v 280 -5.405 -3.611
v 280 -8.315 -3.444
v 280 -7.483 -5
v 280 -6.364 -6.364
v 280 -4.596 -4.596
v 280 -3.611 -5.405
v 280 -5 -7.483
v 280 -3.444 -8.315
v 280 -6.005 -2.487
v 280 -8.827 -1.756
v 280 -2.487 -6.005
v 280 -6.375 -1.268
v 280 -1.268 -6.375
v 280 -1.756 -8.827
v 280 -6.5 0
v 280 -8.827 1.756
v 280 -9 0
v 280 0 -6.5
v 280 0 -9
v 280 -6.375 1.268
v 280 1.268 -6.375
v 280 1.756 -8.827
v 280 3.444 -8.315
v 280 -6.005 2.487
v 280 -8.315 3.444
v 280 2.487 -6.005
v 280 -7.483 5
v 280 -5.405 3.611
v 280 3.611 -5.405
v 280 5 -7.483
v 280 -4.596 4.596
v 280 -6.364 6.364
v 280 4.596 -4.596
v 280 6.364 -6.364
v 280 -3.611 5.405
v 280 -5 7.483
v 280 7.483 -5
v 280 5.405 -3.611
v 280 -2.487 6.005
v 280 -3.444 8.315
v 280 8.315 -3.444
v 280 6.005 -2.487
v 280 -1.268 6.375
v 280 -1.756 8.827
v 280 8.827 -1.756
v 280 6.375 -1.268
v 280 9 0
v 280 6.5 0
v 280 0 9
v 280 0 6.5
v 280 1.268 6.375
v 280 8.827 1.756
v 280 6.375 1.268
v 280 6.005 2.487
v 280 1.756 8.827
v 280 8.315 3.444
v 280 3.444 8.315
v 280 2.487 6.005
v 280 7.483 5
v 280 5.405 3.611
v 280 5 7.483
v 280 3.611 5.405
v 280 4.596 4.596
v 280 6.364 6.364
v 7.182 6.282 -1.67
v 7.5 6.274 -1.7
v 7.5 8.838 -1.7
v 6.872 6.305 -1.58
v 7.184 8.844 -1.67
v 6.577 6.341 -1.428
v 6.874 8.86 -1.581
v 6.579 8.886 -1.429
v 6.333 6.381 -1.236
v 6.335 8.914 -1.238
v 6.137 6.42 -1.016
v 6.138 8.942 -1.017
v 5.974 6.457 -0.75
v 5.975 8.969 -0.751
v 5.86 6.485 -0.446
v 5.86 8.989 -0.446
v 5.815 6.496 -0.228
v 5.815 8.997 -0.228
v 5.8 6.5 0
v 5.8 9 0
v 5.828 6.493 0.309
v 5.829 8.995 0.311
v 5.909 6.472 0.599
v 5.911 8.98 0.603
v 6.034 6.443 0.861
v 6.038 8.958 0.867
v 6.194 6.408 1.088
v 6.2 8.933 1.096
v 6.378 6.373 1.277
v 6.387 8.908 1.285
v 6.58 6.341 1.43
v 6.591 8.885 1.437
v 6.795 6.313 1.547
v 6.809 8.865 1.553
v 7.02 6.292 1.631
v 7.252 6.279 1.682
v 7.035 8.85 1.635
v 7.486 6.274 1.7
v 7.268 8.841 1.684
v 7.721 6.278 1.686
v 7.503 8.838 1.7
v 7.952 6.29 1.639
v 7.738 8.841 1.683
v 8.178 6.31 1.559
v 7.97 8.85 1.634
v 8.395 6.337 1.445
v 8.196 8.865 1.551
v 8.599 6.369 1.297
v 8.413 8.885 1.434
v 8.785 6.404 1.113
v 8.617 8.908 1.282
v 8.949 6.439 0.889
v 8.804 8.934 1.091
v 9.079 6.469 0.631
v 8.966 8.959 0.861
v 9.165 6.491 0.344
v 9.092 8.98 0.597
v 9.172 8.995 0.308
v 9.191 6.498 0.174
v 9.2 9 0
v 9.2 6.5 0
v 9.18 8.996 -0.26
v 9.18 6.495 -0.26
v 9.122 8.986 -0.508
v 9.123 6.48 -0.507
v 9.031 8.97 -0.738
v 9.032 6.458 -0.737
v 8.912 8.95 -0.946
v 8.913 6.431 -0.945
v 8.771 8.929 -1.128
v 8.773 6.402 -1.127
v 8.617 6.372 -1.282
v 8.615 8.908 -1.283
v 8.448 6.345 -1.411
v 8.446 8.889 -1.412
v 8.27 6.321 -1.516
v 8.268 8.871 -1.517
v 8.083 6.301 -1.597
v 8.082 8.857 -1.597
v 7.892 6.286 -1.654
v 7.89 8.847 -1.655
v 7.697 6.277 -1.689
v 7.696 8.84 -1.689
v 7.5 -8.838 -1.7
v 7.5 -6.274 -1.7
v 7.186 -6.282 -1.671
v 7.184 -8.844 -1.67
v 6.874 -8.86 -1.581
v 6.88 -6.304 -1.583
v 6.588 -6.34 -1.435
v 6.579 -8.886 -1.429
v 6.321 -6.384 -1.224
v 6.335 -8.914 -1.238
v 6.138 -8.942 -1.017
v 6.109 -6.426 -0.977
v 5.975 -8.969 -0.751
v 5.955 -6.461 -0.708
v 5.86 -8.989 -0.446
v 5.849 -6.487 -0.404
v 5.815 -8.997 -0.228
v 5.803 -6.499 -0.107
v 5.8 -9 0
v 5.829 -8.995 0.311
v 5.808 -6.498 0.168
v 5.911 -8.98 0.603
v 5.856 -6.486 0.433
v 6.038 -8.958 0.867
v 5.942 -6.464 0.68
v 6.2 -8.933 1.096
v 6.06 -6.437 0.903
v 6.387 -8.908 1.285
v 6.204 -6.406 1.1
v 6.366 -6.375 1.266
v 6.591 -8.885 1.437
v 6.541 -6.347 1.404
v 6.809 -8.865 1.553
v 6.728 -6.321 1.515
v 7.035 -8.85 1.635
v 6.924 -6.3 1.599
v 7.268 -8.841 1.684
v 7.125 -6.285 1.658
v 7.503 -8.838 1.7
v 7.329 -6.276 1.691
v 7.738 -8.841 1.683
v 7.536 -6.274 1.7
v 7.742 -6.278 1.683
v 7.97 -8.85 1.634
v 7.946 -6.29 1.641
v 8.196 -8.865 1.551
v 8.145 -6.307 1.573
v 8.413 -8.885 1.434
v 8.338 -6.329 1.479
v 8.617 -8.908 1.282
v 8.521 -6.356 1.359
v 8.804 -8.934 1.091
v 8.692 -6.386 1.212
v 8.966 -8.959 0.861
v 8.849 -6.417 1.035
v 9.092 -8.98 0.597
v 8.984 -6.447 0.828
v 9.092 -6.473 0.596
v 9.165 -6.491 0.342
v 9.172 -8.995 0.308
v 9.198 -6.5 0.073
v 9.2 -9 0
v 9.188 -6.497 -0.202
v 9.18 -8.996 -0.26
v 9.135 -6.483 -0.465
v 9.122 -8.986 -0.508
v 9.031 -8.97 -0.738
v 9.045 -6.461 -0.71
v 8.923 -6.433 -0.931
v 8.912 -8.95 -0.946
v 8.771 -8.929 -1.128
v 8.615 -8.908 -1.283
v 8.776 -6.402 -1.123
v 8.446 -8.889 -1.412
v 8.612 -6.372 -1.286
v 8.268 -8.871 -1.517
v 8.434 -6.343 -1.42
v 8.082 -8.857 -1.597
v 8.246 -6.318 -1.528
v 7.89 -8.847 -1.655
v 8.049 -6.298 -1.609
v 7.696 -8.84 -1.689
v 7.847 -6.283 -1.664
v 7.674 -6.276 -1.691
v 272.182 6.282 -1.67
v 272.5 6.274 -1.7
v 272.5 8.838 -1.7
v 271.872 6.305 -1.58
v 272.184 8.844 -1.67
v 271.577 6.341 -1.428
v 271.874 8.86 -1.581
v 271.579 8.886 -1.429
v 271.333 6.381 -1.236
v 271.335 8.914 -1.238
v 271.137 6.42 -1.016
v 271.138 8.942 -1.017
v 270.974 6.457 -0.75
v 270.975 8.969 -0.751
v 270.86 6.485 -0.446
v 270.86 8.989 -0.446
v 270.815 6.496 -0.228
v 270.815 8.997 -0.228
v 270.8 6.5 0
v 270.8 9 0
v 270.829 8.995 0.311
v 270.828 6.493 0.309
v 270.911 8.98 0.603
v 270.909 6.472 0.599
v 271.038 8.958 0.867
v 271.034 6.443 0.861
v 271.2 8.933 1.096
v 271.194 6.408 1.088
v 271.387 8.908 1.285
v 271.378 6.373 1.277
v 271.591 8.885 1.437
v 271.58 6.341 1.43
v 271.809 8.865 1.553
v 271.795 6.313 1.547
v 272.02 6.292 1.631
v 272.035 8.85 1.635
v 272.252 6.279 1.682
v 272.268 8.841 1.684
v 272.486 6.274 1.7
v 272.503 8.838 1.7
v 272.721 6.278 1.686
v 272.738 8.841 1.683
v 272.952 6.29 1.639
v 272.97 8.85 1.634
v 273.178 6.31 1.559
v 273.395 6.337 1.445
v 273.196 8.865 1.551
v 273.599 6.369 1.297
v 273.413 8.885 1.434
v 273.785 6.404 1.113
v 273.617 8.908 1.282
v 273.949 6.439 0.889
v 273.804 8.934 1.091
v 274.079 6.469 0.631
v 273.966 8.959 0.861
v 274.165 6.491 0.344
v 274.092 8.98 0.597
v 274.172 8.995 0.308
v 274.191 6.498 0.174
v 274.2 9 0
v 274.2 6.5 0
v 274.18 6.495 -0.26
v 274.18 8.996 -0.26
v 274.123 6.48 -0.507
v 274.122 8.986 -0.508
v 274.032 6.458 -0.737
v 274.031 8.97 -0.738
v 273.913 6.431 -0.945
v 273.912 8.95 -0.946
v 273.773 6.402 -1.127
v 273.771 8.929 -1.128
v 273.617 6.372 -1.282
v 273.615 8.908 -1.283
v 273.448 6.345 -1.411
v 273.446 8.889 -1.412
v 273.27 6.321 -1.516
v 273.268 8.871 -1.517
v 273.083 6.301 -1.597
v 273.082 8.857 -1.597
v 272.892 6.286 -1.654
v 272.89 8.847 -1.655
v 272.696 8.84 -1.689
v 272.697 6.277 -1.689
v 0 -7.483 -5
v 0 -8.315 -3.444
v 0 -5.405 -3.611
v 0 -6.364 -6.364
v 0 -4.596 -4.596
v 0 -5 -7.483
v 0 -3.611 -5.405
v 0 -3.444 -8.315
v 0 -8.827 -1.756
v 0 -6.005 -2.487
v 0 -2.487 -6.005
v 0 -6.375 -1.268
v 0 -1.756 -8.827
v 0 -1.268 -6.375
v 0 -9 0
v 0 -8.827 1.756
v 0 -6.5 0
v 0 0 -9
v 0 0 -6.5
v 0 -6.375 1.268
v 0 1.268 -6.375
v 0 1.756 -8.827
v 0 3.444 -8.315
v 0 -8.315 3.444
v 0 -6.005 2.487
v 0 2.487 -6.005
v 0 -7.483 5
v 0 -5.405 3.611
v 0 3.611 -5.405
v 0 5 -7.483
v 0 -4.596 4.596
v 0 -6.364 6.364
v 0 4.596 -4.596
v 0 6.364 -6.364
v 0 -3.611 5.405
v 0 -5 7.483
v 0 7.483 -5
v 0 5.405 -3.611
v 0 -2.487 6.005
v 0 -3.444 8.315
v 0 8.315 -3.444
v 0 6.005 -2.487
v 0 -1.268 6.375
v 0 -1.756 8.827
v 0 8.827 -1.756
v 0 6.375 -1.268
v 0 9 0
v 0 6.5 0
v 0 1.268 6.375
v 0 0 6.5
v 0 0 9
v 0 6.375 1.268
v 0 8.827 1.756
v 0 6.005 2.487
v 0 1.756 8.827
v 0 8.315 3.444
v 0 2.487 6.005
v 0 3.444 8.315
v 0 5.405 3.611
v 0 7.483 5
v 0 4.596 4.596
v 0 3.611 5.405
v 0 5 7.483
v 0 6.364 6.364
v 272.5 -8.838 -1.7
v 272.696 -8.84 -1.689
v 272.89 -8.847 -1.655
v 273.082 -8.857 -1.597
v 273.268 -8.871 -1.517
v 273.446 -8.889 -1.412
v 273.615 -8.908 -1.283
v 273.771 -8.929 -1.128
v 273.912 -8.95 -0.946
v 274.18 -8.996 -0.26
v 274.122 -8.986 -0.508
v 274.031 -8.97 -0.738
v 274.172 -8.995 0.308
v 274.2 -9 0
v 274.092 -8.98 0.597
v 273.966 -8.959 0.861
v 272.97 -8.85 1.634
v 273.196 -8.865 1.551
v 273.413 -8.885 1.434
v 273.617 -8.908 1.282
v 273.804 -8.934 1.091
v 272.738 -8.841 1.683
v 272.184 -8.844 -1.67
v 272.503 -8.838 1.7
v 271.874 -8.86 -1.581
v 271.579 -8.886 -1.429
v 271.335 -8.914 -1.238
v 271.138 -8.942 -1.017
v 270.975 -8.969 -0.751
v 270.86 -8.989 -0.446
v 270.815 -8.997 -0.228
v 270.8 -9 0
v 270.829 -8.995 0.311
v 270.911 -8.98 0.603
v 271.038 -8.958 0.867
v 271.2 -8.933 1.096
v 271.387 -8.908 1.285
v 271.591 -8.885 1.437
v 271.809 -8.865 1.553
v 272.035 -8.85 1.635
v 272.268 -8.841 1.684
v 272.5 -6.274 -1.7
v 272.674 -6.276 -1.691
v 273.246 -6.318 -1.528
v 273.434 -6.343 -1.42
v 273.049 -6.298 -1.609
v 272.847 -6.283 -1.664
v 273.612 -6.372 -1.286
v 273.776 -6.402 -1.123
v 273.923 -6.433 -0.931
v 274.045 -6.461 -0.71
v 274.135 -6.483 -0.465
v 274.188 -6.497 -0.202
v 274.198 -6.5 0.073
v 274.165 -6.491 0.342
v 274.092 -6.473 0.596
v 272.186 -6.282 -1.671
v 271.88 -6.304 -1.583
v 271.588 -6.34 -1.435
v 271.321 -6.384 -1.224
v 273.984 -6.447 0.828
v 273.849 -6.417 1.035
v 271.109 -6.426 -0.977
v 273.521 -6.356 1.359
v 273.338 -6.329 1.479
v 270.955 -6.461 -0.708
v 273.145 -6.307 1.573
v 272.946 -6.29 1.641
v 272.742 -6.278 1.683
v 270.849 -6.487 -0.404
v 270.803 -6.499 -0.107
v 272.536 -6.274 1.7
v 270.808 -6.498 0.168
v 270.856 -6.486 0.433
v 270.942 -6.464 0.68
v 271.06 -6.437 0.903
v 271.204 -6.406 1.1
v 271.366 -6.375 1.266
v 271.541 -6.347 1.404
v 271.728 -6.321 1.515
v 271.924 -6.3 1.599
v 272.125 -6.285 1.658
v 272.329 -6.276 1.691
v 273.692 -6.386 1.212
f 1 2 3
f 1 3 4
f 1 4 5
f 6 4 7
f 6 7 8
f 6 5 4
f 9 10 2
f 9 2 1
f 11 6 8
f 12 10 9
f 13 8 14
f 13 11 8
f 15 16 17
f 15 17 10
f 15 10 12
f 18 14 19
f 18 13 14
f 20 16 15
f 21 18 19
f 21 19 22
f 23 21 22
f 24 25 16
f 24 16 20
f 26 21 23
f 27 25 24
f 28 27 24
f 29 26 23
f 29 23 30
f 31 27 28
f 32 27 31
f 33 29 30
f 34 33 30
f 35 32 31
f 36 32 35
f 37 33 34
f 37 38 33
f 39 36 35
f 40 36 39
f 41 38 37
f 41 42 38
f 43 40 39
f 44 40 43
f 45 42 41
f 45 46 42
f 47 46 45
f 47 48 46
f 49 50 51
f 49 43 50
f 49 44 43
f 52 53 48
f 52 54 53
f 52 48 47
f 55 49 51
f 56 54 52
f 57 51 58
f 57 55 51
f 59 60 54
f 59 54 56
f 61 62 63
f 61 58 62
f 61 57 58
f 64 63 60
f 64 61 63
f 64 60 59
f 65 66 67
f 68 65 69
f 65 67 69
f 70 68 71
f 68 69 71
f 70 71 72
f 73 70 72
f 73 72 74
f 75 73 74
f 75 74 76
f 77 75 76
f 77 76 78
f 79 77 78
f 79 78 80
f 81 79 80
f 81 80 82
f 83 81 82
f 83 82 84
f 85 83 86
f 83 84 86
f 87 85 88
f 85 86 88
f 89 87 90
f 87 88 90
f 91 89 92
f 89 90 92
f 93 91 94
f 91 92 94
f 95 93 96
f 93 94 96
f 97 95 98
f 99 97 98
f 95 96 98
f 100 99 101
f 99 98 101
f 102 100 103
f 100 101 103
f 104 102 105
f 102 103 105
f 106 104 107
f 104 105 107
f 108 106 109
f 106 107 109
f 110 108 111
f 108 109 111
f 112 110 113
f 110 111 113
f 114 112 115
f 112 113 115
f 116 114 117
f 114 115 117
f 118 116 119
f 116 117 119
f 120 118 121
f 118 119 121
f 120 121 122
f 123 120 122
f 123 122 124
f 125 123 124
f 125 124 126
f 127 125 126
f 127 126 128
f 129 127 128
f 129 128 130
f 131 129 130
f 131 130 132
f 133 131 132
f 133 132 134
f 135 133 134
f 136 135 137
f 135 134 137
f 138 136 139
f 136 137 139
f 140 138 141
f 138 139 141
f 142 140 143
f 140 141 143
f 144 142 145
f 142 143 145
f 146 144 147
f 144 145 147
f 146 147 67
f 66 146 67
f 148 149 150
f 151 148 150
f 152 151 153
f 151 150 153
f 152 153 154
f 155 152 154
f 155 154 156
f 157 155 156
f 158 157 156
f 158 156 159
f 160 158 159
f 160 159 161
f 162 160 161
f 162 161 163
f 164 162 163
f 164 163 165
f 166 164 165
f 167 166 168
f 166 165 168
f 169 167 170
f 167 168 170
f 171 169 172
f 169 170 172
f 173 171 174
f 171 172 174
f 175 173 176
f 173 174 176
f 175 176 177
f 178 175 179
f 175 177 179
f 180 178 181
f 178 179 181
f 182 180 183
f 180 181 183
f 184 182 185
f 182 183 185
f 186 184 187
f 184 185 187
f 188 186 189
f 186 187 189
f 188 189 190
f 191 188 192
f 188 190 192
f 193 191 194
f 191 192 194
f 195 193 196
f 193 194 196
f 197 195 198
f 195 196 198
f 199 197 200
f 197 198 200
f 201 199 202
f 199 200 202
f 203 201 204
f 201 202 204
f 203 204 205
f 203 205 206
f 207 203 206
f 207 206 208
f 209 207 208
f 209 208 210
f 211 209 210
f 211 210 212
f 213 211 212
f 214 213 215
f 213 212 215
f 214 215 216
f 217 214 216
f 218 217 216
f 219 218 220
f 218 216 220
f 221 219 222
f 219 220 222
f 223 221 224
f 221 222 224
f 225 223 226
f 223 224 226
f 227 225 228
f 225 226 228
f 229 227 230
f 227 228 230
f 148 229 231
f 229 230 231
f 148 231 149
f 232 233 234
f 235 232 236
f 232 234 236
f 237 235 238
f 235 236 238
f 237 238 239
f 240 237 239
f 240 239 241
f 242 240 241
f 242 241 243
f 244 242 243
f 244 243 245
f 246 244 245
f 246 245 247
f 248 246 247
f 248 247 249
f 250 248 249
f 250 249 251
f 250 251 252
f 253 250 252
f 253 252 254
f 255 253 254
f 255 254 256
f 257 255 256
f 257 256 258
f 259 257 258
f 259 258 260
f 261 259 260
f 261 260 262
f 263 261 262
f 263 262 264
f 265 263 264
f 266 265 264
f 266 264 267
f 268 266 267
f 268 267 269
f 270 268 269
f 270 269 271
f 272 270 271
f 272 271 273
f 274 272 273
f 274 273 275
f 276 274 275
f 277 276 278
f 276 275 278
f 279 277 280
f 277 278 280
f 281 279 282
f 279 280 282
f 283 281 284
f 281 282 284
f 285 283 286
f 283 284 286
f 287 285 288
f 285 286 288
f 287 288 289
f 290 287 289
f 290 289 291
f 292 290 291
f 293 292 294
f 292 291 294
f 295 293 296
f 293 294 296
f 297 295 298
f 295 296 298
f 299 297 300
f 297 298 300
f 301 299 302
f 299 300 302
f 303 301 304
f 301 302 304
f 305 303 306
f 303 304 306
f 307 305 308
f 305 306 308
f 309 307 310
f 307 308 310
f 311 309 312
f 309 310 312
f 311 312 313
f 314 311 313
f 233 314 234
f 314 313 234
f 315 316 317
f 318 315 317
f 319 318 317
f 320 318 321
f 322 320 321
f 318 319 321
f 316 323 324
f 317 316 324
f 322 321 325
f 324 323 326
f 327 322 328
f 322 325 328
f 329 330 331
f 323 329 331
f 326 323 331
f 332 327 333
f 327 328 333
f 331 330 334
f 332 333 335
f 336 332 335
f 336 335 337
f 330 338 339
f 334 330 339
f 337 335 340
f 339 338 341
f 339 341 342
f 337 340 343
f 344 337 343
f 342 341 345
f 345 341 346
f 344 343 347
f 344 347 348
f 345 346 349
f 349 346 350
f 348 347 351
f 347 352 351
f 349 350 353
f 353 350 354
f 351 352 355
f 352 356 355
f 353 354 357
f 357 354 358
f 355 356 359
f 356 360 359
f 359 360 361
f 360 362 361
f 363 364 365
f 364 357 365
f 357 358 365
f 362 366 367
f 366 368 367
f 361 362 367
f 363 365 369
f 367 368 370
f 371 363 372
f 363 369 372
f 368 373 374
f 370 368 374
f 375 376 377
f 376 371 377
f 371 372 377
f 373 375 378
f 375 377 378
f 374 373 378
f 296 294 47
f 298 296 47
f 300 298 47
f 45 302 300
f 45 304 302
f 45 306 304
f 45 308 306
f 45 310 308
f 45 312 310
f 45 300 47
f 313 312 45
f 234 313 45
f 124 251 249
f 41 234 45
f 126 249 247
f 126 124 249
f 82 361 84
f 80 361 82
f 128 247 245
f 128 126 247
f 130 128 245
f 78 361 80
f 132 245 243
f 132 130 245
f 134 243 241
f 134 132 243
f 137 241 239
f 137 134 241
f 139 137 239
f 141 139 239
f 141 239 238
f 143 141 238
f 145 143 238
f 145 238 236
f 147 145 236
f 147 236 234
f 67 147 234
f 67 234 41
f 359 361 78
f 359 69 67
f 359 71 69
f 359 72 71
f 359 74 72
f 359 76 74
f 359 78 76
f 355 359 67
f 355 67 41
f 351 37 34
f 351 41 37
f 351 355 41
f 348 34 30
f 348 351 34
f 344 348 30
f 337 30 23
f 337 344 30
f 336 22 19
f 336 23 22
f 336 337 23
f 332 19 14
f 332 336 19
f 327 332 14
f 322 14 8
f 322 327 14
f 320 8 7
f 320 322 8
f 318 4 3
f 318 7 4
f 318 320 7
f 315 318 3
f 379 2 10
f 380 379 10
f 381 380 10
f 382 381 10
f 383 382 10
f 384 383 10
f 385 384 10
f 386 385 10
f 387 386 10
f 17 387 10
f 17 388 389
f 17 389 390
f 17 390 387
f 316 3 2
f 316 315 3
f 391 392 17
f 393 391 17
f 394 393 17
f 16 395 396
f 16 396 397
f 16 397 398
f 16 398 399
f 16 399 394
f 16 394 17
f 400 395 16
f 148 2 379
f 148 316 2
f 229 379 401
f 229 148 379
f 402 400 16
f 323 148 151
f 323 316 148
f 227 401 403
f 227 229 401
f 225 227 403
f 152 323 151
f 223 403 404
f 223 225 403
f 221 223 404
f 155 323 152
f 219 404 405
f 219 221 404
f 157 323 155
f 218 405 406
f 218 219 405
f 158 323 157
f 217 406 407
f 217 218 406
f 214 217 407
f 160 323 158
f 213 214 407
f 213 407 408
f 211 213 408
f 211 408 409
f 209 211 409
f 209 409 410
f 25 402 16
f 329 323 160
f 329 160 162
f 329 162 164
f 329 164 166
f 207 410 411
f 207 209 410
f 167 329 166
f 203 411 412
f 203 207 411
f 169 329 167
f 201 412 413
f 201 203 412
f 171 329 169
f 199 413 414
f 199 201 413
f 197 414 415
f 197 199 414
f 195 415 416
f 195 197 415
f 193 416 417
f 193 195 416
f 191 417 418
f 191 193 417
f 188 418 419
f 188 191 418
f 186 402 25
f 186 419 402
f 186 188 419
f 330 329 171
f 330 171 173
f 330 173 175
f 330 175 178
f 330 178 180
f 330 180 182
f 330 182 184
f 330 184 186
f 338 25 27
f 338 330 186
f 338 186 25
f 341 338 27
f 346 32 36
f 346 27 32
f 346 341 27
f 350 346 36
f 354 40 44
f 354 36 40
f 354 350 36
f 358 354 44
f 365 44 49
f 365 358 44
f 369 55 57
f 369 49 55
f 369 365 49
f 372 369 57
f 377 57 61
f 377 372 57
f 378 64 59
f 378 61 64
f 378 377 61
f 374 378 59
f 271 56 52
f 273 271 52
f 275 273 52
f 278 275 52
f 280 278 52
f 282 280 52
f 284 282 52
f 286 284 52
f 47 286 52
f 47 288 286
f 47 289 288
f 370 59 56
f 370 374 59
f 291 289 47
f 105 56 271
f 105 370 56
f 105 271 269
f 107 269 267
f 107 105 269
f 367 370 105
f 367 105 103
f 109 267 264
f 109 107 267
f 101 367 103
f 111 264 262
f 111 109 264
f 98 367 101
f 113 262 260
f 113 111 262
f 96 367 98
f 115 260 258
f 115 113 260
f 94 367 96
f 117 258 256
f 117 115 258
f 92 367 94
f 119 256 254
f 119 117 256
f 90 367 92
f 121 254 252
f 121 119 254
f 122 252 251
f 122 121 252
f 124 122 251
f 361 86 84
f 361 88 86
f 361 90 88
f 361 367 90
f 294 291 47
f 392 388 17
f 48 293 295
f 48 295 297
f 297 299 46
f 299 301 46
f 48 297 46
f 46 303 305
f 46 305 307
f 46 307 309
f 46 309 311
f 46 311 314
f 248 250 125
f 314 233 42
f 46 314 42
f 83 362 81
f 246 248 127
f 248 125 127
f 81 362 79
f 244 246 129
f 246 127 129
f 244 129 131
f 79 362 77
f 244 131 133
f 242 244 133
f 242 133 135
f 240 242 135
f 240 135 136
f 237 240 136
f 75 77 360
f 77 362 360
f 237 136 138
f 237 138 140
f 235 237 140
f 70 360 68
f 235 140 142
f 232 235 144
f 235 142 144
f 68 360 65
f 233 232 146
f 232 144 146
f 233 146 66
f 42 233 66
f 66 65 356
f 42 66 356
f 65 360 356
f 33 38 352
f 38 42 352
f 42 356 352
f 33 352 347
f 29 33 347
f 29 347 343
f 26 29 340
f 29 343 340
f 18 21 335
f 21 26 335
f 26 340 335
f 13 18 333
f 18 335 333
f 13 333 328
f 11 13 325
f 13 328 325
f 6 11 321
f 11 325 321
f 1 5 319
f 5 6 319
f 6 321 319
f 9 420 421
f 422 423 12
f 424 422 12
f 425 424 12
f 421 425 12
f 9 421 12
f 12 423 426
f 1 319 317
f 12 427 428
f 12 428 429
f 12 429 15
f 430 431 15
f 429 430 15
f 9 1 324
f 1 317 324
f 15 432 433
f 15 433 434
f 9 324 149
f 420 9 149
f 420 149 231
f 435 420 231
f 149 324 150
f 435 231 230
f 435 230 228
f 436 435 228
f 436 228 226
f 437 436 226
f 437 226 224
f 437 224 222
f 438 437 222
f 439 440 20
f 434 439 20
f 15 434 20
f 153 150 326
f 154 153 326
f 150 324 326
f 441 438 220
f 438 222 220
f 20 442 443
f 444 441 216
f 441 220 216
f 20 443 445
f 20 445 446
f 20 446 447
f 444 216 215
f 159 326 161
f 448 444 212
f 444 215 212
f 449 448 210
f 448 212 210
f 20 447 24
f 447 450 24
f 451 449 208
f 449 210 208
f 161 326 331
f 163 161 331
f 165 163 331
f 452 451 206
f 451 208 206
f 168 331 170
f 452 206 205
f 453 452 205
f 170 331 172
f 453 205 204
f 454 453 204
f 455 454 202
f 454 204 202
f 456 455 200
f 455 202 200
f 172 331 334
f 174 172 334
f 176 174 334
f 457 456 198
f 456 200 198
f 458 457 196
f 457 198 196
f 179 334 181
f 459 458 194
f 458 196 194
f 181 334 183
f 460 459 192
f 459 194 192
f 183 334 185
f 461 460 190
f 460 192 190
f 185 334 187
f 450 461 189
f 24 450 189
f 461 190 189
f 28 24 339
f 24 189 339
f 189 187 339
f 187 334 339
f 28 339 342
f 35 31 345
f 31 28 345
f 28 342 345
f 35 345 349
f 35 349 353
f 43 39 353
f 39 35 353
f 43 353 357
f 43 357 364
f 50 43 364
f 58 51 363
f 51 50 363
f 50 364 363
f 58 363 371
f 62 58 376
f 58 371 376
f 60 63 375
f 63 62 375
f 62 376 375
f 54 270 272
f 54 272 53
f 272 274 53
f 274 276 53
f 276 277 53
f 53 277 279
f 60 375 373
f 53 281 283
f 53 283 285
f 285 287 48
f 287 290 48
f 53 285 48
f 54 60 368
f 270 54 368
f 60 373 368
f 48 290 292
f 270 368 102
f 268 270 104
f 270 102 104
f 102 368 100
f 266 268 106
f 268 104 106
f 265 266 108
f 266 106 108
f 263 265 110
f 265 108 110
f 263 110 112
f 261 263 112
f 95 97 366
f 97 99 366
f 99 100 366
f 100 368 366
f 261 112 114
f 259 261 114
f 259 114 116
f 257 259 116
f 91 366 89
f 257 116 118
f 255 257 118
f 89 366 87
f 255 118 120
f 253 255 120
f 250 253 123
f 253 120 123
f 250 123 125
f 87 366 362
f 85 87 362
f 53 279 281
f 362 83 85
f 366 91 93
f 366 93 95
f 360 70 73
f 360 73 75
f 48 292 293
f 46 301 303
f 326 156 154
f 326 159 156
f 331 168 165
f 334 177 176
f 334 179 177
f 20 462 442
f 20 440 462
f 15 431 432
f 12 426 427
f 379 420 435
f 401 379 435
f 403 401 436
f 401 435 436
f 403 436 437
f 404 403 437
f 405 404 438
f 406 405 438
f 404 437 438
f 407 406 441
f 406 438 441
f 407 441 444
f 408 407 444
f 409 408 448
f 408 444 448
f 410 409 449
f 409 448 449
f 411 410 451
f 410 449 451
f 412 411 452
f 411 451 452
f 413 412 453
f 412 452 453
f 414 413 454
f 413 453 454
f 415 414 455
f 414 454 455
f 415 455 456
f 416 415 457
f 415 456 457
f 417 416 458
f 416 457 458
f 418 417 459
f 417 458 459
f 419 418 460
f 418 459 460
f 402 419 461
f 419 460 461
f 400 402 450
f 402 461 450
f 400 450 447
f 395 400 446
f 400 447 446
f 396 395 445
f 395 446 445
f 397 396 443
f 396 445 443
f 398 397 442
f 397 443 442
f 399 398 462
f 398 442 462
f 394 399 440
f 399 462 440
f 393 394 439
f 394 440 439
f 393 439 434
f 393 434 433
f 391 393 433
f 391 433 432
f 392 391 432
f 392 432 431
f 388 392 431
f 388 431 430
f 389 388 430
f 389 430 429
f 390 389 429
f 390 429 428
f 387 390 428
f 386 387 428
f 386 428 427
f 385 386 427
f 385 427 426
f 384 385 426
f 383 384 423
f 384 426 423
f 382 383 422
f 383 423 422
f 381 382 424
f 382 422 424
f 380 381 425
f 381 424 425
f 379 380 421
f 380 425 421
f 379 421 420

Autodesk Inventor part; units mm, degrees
ref_plane "YZ Plane" through (0, 0, 0) normal (1, 0, 0) x (0, 1, 0)
ref_plane "XY Plane" through (0, 0, 0) normal (0, 0, 1) x (1, 0, 0)
sketch "スケッチ1" plane through (0, 0, 0) normal (1, 0, 0) x (0, 1, 0)
  circle A0 centre (0, 0) radius 9
  circle A1 centre (0, 0) radius 6.5
  dimension "d0" = 18
  dimension "d1" = 13
extrude "押し出し1" add sketch "スケッチ1" along normal blind 280
ref_plane "作業平面1" through (0, -9, 0) normal (0, 1, 0) x (-1, 0, 0)
sketch "スケッチ2" plane through (0, -9, 0) normal (0, 1, 0) x (-1, 0, 0)
  line L0 (0, 9) -> (0, -9) projected
  line L1 (-280, 9) -> (-280, -9) projected
  point P0 (0, 0)
  point P1 (-7.5, 0)
  point P2 (-272.5, 0)
  dimension "d4" = 7.5
  dimension "d5" = 7.5
hole "穴1" at (7.5, -9, 0) at (272.5, -9, 0) direction (0, 1, 0) diameter 3.4 end through all
properties part number "roller-hand-v1-roller" material "PVC 配管"
